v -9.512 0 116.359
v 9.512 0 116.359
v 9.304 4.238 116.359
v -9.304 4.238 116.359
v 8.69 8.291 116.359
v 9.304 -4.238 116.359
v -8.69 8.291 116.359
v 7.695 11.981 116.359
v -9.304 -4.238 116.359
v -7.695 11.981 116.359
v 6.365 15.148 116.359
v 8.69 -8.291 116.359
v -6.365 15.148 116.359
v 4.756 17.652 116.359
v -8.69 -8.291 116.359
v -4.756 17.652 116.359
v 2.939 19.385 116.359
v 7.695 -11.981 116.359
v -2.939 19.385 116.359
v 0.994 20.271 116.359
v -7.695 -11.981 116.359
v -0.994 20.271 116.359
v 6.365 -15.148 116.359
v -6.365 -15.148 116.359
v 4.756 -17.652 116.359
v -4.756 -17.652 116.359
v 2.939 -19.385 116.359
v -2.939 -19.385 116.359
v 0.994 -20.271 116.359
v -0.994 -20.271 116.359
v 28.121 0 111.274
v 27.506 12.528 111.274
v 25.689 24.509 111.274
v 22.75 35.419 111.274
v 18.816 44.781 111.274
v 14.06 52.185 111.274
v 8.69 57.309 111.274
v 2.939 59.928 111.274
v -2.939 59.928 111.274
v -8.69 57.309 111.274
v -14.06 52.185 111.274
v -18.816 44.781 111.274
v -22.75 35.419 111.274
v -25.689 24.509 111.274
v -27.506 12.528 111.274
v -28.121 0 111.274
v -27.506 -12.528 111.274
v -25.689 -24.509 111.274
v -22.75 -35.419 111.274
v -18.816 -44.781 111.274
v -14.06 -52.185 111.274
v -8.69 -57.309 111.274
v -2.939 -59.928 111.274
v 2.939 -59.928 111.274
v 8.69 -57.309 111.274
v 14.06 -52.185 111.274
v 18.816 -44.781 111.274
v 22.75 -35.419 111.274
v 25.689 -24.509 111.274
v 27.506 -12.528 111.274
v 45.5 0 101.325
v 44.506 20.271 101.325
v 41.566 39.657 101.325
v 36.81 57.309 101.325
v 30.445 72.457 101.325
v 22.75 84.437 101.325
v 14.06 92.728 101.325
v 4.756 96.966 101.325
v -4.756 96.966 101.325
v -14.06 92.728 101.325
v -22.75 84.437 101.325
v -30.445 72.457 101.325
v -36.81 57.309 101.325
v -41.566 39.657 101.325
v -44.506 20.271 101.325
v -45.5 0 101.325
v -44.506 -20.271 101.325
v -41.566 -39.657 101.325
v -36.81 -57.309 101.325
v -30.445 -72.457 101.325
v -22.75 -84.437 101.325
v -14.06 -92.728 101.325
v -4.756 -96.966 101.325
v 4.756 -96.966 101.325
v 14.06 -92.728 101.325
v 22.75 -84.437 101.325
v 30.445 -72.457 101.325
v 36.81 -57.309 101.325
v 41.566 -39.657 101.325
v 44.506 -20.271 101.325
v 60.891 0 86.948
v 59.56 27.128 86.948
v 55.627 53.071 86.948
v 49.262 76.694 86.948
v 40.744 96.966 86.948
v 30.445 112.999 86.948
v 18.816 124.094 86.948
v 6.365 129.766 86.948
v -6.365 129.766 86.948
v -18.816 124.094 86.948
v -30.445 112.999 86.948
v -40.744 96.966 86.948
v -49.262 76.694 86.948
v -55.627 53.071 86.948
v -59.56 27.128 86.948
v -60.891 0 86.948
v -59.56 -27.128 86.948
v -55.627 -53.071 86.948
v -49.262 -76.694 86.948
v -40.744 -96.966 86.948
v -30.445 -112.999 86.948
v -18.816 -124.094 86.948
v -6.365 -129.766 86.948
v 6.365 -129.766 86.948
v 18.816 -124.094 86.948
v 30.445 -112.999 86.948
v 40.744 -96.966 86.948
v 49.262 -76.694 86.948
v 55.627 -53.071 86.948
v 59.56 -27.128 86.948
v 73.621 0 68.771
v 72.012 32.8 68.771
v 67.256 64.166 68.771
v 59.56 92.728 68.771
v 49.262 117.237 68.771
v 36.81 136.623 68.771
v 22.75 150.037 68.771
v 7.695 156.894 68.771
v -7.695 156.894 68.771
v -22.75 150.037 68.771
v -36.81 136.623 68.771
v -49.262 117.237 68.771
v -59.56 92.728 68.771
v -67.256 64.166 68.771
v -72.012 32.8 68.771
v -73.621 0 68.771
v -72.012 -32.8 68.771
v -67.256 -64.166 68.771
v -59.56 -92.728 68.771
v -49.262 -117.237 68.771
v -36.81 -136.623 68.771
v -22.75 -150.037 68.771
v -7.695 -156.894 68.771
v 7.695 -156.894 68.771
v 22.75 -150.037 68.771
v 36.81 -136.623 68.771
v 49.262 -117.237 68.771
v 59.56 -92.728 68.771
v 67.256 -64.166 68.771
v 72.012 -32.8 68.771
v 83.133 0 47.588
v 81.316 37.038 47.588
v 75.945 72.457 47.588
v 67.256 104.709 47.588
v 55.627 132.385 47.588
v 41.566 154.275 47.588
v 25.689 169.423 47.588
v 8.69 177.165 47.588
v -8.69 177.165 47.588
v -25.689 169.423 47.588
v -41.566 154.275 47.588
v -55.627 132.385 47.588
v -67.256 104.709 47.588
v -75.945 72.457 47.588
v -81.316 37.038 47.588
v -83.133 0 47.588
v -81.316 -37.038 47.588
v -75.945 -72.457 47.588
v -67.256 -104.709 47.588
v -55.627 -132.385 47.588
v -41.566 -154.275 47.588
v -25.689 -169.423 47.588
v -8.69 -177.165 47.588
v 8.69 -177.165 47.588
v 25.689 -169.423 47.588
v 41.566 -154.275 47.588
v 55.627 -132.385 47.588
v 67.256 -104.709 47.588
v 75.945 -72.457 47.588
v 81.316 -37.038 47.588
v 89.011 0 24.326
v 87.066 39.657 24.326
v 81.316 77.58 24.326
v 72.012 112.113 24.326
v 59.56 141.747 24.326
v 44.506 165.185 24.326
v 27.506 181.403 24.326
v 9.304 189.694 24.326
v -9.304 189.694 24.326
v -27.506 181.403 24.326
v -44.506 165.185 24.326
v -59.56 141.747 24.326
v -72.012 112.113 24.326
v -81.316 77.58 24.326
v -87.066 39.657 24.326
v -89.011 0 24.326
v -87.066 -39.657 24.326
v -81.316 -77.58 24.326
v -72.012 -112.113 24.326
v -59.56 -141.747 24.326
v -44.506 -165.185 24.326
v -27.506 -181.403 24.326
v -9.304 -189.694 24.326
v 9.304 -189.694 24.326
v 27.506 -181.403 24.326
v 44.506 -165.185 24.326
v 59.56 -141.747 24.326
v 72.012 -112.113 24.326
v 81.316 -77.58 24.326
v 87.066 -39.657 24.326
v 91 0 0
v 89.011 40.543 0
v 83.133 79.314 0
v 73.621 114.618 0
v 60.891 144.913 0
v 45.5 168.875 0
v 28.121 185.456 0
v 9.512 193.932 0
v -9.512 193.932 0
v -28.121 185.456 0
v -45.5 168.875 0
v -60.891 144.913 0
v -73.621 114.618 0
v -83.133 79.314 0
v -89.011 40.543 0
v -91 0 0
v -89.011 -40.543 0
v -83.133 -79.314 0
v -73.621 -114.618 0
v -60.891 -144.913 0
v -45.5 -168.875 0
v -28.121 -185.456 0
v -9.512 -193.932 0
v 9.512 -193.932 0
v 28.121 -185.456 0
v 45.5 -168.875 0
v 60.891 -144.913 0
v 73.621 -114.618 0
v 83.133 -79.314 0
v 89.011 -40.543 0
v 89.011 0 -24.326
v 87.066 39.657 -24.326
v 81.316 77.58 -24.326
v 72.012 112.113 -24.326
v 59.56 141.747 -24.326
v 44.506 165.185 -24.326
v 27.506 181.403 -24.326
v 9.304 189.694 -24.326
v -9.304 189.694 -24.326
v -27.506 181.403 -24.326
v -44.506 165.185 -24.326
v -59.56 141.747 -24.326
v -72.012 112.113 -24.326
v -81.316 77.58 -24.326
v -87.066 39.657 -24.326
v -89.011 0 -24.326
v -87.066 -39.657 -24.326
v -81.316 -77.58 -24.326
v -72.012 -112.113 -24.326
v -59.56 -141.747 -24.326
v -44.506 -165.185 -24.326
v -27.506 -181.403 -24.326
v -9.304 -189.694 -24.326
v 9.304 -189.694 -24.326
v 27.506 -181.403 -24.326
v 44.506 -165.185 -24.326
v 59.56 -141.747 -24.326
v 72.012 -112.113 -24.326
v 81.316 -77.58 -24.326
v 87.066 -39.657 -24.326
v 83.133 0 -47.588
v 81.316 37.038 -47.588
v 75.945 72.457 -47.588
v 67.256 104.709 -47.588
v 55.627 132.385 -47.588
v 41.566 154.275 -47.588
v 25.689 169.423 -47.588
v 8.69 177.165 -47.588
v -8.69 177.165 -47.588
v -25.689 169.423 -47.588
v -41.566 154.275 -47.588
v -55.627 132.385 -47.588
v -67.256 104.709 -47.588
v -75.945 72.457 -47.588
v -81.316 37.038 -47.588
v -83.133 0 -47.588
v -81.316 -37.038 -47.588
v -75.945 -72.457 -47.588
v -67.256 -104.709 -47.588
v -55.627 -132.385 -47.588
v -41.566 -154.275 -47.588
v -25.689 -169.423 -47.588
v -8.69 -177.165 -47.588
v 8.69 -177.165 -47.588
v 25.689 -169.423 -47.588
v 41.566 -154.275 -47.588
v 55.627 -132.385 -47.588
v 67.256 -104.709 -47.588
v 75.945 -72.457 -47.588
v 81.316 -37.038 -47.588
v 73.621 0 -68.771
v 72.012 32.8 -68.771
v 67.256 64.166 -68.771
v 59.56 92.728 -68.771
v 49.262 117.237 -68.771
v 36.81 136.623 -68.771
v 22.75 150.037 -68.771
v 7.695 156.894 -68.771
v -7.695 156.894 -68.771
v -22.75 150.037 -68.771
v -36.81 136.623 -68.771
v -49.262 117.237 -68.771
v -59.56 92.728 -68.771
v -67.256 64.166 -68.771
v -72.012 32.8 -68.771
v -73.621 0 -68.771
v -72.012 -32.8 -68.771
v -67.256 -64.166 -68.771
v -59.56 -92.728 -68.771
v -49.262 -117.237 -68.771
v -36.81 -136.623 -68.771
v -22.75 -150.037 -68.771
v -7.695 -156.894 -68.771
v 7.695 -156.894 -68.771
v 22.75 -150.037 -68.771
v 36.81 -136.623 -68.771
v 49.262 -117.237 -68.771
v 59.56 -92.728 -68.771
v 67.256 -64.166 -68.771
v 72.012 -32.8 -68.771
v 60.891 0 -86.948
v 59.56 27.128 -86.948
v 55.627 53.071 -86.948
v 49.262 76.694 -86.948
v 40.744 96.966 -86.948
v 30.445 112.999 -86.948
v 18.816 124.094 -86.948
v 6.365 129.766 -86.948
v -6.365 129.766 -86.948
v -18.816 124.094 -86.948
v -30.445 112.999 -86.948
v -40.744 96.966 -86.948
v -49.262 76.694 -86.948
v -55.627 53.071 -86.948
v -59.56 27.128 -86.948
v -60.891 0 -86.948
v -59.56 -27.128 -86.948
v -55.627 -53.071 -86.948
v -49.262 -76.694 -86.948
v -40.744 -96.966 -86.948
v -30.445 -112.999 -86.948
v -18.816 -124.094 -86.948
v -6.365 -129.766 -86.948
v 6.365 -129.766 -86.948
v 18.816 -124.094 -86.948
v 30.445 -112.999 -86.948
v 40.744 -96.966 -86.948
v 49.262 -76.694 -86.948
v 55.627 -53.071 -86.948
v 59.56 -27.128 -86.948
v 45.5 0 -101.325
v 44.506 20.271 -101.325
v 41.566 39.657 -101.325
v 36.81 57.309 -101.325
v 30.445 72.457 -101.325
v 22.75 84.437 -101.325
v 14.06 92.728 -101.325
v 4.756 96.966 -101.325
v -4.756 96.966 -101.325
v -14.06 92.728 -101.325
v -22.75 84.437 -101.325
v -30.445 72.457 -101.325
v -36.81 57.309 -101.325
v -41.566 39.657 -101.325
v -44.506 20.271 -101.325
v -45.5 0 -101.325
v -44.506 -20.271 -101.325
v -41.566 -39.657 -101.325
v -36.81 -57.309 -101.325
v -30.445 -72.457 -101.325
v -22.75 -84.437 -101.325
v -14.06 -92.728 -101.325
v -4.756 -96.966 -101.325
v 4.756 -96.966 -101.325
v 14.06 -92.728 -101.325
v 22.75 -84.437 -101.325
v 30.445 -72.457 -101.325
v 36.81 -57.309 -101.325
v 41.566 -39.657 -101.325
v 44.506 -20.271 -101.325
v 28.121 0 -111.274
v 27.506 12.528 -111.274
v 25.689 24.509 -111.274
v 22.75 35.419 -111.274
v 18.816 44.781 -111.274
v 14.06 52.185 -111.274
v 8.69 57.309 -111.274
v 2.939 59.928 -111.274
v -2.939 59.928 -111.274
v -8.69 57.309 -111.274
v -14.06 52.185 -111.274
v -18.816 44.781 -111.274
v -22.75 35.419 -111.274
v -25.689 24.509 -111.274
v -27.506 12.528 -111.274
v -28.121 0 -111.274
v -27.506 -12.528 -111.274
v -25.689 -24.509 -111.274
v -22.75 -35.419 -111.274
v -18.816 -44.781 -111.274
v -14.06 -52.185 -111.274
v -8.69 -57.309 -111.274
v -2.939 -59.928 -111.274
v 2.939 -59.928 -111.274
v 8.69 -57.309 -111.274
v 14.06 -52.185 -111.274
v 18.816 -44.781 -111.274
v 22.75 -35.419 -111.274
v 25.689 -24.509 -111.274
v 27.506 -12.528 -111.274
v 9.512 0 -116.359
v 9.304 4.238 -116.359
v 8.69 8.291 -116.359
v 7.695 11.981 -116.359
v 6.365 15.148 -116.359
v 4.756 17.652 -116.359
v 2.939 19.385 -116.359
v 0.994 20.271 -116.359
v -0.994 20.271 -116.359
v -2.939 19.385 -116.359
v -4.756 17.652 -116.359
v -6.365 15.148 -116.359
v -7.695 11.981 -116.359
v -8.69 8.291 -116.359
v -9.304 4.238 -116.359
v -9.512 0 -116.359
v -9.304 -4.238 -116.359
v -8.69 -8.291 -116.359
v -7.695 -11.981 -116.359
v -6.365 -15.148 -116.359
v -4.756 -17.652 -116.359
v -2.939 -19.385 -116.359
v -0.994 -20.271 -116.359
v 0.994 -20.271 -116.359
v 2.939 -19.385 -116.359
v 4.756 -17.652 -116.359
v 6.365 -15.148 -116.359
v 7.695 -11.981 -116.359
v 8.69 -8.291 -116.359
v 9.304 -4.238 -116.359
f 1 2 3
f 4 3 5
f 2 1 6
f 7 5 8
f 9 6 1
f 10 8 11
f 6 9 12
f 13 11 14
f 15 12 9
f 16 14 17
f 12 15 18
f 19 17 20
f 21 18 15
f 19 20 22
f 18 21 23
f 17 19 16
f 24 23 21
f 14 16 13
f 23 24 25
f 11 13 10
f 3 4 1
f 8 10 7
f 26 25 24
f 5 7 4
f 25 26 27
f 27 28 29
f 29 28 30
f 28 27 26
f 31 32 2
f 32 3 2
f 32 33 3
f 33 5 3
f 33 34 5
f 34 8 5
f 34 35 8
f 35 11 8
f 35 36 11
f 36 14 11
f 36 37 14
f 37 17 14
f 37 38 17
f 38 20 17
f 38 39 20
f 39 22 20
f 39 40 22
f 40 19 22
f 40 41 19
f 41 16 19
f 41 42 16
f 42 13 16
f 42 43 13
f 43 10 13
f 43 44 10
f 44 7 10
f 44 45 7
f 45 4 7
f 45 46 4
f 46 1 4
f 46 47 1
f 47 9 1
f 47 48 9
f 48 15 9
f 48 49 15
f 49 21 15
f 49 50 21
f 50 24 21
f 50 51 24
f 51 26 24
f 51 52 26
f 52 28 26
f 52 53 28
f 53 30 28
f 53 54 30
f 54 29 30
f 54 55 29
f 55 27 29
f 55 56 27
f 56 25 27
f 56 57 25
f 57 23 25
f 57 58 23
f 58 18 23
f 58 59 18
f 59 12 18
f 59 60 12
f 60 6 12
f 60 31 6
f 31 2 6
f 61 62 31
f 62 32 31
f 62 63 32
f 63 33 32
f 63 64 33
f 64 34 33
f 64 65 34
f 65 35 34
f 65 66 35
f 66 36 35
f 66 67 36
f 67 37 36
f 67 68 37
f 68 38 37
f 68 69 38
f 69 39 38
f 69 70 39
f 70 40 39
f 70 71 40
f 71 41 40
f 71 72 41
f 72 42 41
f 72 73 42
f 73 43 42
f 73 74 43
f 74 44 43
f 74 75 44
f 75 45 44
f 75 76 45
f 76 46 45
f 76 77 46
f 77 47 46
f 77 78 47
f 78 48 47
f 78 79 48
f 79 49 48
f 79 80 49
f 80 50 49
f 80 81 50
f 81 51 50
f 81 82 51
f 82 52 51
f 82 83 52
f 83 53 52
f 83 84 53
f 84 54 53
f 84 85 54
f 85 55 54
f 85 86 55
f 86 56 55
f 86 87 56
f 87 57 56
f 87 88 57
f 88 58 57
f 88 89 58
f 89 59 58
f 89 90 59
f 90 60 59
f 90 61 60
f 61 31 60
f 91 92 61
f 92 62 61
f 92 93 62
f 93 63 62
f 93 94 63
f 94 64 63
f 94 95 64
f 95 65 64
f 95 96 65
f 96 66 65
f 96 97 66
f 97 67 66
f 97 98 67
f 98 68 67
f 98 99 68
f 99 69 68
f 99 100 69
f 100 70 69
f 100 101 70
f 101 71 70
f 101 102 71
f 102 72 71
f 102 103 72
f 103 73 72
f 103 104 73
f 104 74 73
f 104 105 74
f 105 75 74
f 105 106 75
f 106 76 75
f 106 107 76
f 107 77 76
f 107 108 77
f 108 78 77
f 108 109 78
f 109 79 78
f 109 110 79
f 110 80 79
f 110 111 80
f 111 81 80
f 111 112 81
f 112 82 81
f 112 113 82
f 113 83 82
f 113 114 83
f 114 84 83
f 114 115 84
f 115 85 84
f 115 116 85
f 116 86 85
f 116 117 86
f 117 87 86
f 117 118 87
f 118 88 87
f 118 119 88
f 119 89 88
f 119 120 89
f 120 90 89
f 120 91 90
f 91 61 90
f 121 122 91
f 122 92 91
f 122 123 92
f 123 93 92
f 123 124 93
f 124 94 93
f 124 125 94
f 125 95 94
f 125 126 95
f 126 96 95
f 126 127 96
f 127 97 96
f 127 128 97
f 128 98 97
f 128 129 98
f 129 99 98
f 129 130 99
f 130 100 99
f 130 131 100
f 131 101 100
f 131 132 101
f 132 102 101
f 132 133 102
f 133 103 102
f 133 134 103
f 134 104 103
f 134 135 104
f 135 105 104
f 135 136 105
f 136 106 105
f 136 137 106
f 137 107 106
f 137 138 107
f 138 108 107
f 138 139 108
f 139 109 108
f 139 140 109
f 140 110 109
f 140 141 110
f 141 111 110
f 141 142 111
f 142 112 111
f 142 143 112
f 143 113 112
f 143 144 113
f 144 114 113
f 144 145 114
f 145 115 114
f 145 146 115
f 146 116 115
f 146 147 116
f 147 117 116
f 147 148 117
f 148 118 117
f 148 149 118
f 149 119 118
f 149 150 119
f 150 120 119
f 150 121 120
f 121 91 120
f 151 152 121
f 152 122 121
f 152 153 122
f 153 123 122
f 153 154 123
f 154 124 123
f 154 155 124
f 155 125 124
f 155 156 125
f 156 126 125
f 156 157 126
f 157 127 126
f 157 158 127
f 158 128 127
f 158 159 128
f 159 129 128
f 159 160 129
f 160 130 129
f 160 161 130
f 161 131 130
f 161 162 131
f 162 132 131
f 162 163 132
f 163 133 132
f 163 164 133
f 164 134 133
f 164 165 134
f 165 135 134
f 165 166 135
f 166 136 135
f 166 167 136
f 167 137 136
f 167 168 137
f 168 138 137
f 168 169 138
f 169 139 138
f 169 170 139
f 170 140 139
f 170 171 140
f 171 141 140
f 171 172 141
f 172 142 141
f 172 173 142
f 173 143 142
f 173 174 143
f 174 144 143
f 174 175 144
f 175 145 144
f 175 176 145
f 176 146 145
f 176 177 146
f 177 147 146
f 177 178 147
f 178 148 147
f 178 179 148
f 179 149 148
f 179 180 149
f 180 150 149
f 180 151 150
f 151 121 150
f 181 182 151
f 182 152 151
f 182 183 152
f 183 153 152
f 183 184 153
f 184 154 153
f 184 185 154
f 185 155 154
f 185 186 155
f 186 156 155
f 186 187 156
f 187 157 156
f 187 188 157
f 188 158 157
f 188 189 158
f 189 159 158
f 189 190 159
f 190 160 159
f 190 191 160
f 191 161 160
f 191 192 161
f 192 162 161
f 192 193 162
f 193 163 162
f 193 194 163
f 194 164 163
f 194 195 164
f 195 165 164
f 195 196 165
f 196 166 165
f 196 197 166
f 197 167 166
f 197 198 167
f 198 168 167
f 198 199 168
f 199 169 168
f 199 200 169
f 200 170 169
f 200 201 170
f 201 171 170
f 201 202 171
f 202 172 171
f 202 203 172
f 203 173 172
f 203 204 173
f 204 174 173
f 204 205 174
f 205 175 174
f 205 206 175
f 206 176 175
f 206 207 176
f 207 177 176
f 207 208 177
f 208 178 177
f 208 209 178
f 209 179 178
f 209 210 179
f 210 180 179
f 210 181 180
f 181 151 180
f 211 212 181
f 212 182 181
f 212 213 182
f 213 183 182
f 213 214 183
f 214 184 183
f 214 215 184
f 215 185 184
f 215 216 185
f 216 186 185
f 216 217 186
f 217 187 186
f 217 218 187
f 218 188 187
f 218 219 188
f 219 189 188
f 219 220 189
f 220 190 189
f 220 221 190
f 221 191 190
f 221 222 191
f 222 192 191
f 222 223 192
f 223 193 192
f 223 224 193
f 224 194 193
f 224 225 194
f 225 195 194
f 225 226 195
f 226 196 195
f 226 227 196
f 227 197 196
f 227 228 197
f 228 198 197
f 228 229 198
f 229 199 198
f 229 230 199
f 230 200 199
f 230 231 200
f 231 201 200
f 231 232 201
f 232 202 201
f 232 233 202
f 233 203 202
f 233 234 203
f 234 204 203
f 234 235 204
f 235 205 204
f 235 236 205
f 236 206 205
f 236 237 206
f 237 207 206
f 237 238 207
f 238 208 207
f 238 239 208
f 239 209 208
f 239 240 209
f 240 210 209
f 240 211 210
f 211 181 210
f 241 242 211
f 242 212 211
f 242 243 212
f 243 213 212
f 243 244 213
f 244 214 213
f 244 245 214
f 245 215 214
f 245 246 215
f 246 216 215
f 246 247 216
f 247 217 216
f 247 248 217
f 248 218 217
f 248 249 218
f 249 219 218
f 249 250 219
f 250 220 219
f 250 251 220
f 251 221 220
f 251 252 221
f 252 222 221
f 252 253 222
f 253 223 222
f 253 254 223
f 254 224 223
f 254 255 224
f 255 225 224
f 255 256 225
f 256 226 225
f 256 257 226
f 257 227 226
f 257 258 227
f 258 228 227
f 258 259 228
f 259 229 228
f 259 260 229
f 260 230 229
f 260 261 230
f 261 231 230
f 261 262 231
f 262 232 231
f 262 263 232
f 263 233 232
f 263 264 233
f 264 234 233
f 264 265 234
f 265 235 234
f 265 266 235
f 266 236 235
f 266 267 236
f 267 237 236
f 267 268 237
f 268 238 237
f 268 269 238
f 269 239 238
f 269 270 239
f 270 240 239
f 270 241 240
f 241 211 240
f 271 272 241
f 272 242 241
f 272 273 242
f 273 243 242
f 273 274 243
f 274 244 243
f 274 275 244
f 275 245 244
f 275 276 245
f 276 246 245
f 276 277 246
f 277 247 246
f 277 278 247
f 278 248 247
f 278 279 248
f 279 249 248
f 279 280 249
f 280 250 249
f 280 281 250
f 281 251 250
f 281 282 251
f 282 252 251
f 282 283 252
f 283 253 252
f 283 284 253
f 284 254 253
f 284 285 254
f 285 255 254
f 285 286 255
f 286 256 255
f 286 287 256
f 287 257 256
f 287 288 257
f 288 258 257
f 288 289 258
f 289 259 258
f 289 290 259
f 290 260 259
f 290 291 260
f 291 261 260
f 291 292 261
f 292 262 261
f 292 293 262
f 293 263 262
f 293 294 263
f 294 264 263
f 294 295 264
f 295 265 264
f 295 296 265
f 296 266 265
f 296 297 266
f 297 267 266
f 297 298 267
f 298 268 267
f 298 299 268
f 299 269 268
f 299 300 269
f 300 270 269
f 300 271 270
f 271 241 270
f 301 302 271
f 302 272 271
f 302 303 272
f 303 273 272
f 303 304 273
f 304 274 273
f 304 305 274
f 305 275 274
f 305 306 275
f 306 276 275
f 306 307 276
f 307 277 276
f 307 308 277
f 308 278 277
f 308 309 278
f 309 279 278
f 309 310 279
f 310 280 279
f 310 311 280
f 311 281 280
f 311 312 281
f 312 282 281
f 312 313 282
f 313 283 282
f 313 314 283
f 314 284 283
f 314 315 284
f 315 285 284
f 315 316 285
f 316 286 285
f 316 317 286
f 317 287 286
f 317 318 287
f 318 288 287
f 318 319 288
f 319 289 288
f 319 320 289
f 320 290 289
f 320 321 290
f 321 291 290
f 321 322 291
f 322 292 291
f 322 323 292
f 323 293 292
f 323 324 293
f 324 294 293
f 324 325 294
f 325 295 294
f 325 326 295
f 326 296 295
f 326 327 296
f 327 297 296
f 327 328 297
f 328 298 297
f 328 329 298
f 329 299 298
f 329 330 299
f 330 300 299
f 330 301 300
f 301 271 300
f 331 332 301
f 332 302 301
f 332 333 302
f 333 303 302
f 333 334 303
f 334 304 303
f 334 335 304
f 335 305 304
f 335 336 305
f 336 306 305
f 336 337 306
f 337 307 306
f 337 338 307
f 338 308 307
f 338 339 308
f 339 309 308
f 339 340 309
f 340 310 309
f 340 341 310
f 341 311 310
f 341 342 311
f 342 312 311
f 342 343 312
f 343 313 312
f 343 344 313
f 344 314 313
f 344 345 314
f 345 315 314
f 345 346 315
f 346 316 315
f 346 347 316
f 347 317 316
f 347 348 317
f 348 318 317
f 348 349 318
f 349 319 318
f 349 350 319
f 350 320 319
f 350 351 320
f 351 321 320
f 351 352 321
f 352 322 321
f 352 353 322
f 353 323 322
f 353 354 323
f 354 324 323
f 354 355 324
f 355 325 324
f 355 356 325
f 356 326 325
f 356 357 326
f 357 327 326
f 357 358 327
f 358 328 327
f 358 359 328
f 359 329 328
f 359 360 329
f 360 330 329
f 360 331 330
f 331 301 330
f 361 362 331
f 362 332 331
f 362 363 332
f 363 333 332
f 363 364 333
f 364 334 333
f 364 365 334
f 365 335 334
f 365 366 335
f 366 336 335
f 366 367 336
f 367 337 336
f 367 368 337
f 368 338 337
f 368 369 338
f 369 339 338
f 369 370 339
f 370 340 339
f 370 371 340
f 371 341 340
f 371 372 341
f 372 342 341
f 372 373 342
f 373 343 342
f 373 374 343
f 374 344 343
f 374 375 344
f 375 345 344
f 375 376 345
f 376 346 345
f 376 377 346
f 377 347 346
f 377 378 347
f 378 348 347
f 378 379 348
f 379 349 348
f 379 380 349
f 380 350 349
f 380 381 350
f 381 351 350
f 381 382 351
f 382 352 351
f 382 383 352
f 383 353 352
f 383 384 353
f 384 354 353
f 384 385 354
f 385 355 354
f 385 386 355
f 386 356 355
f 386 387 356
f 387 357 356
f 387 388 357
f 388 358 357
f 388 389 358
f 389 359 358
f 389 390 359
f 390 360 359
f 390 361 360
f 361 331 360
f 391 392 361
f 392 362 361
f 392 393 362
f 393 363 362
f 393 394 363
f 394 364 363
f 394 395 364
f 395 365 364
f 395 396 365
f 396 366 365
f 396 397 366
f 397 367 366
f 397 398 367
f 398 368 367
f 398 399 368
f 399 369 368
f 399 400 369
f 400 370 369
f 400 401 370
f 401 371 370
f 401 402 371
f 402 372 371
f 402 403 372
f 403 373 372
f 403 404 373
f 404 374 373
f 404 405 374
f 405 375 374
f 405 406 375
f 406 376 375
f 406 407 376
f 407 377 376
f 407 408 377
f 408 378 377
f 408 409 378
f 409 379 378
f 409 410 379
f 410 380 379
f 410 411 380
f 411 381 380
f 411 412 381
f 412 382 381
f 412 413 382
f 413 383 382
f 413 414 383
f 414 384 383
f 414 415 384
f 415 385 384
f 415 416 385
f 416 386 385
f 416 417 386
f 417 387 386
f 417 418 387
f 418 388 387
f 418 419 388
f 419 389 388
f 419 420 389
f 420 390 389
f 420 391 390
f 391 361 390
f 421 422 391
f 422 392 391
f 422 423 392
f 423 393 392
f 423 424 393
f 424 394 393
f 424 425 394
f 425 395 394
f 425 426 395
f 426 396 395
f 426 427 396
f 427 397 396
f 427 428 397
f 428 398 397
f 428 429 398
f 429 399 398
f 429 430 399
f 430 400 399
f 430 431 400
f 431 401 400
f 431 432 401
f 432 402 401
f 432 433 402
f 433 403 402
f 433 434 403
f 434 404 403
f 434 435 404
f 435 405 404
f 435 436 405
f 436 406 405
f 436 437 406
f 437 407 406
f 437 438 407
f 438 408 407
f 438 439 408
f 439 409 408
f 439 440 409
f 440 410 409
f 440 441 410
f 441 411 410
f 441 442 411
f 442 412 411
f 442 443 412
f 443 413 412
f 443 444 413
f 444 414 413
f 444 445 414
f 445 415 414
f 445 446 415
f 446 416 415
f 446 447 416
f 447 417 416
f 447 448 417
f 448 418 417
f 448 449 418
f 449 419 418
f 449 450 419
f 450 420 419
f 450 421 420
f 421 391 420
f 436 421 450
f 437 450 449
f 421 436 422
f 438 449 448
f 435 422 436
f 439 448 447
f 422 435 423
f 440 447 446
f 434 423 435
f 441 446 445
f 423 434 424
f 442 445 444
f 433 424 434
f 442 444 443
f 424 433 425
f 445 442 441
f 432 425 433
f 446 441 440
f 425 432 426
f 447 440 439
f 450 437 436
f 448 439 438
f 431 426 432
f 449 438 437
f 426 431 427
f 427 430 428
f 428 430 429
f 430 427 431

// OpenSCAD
// Generated by SolidPython 1.0.1 on 2020-07-29 00:46:48


scale(v = [7, 15, 9]) {
	sphere(r = 13);
}
/***********************************************
*********      SolidPython code:      **********
************************************************
 
# import packages: SolidPython
from solid import *
from solid.utils import *
from itertools import chain, combinations, permutations


class Resize:

    def __init__(self, scad_file):
        self.scad_file = scad_file
        #self.scad_file = import_scad(scad_file)
        # cone/cylinder param:
        self.r1 = 0
        self.r2 = 0
        self.h = 0
        # rectangular prism param:
        self.w = 0
        self.l = 0
        # ellipse param:
        self.r = 0

    # import OpenScad code (file name corresponds to shape)


    # classify shape + parameters
    def assign(self, param1, param2, param3):
        if self.scad_file == 'cone.scad':
            self.r1 = param1
            self.r2 = param2
            self.h = param3
        elif self.scad_file == 'cylinder.scad':
            self.r1 = param1
            self.r2 = param2
            self.h = param3
        elif self.scad_file == 'rectangularPrism.scad':
            self.h = param1
            self.l = param2
            self.w = param3
        else:
            self.r = param1
            self.h = param2

    # resize parameters
    def iterate(self):
        x = range(3, 20, 2)
        i = 1
        if self.scad_file == 'cone.scad':
            tempList = list(permutations(x, 2))
            for temp in tempList:
                param1 = temp[0]
                param2 = temp[1]
                filepath = 'produced_scad_files/' + 'cone' + str(param1) + '_' + str(param2) + '_' + '.scad'
                scad_render_to_file(cylinder(h=param1, r1=param2, r2=0), filepath)

        elif self.scad_file == 'cylinder.scad':
            tempList = list(permutations(x, 3))
            for temp in tempList:
                param1 = temp[0]
                param2 = temp[1]
                filepath = 'produced_scad_files/' + 'cylinder' + str(param1) + '_' + str(param2) + '_' + '.scad'
                scad_render_to_file(cylinder(h=param1, r1=param2, r2=param2), filepath)

        elif self.scad_file == 'rectangularPrism.scad':
            tempList = list(permutations(x, 3))
            for temp in tempList:
                param1 = temp[0]
                param2 = temp[1]
                param3 = temp[2]
                filepath = 'produced_scad_files/' + 'rectangularPrism' + str(param1) + '_' + str(param2) + '_' + str(
                    param3) + '.scad'
                scad_render_to_file(cube(size=(param1, param2, param3)), filepath)

        elif self.scad_file == 'ellipse.scad':
            tempList = list(permutations(x, 4))
            for temp in tempList:
                param1 = temp[0]
                param2 = temp[1]
                param3 = temp[2]
                param4 = temp[3]
                filepath = 'produced_scad_files/' + 'ellipse' + str(param1) + '_' + str(param2) + '_' + str(param3) + '_' + str(param4) + '.scad'
                scad_render_to_file(scale([param1, param2, param3])(sphere(r=param4)), filepath)

    def render_to_scadfile(self):
        scad_render_to_file(scad, 'example.scad') 
 
************************************************/
